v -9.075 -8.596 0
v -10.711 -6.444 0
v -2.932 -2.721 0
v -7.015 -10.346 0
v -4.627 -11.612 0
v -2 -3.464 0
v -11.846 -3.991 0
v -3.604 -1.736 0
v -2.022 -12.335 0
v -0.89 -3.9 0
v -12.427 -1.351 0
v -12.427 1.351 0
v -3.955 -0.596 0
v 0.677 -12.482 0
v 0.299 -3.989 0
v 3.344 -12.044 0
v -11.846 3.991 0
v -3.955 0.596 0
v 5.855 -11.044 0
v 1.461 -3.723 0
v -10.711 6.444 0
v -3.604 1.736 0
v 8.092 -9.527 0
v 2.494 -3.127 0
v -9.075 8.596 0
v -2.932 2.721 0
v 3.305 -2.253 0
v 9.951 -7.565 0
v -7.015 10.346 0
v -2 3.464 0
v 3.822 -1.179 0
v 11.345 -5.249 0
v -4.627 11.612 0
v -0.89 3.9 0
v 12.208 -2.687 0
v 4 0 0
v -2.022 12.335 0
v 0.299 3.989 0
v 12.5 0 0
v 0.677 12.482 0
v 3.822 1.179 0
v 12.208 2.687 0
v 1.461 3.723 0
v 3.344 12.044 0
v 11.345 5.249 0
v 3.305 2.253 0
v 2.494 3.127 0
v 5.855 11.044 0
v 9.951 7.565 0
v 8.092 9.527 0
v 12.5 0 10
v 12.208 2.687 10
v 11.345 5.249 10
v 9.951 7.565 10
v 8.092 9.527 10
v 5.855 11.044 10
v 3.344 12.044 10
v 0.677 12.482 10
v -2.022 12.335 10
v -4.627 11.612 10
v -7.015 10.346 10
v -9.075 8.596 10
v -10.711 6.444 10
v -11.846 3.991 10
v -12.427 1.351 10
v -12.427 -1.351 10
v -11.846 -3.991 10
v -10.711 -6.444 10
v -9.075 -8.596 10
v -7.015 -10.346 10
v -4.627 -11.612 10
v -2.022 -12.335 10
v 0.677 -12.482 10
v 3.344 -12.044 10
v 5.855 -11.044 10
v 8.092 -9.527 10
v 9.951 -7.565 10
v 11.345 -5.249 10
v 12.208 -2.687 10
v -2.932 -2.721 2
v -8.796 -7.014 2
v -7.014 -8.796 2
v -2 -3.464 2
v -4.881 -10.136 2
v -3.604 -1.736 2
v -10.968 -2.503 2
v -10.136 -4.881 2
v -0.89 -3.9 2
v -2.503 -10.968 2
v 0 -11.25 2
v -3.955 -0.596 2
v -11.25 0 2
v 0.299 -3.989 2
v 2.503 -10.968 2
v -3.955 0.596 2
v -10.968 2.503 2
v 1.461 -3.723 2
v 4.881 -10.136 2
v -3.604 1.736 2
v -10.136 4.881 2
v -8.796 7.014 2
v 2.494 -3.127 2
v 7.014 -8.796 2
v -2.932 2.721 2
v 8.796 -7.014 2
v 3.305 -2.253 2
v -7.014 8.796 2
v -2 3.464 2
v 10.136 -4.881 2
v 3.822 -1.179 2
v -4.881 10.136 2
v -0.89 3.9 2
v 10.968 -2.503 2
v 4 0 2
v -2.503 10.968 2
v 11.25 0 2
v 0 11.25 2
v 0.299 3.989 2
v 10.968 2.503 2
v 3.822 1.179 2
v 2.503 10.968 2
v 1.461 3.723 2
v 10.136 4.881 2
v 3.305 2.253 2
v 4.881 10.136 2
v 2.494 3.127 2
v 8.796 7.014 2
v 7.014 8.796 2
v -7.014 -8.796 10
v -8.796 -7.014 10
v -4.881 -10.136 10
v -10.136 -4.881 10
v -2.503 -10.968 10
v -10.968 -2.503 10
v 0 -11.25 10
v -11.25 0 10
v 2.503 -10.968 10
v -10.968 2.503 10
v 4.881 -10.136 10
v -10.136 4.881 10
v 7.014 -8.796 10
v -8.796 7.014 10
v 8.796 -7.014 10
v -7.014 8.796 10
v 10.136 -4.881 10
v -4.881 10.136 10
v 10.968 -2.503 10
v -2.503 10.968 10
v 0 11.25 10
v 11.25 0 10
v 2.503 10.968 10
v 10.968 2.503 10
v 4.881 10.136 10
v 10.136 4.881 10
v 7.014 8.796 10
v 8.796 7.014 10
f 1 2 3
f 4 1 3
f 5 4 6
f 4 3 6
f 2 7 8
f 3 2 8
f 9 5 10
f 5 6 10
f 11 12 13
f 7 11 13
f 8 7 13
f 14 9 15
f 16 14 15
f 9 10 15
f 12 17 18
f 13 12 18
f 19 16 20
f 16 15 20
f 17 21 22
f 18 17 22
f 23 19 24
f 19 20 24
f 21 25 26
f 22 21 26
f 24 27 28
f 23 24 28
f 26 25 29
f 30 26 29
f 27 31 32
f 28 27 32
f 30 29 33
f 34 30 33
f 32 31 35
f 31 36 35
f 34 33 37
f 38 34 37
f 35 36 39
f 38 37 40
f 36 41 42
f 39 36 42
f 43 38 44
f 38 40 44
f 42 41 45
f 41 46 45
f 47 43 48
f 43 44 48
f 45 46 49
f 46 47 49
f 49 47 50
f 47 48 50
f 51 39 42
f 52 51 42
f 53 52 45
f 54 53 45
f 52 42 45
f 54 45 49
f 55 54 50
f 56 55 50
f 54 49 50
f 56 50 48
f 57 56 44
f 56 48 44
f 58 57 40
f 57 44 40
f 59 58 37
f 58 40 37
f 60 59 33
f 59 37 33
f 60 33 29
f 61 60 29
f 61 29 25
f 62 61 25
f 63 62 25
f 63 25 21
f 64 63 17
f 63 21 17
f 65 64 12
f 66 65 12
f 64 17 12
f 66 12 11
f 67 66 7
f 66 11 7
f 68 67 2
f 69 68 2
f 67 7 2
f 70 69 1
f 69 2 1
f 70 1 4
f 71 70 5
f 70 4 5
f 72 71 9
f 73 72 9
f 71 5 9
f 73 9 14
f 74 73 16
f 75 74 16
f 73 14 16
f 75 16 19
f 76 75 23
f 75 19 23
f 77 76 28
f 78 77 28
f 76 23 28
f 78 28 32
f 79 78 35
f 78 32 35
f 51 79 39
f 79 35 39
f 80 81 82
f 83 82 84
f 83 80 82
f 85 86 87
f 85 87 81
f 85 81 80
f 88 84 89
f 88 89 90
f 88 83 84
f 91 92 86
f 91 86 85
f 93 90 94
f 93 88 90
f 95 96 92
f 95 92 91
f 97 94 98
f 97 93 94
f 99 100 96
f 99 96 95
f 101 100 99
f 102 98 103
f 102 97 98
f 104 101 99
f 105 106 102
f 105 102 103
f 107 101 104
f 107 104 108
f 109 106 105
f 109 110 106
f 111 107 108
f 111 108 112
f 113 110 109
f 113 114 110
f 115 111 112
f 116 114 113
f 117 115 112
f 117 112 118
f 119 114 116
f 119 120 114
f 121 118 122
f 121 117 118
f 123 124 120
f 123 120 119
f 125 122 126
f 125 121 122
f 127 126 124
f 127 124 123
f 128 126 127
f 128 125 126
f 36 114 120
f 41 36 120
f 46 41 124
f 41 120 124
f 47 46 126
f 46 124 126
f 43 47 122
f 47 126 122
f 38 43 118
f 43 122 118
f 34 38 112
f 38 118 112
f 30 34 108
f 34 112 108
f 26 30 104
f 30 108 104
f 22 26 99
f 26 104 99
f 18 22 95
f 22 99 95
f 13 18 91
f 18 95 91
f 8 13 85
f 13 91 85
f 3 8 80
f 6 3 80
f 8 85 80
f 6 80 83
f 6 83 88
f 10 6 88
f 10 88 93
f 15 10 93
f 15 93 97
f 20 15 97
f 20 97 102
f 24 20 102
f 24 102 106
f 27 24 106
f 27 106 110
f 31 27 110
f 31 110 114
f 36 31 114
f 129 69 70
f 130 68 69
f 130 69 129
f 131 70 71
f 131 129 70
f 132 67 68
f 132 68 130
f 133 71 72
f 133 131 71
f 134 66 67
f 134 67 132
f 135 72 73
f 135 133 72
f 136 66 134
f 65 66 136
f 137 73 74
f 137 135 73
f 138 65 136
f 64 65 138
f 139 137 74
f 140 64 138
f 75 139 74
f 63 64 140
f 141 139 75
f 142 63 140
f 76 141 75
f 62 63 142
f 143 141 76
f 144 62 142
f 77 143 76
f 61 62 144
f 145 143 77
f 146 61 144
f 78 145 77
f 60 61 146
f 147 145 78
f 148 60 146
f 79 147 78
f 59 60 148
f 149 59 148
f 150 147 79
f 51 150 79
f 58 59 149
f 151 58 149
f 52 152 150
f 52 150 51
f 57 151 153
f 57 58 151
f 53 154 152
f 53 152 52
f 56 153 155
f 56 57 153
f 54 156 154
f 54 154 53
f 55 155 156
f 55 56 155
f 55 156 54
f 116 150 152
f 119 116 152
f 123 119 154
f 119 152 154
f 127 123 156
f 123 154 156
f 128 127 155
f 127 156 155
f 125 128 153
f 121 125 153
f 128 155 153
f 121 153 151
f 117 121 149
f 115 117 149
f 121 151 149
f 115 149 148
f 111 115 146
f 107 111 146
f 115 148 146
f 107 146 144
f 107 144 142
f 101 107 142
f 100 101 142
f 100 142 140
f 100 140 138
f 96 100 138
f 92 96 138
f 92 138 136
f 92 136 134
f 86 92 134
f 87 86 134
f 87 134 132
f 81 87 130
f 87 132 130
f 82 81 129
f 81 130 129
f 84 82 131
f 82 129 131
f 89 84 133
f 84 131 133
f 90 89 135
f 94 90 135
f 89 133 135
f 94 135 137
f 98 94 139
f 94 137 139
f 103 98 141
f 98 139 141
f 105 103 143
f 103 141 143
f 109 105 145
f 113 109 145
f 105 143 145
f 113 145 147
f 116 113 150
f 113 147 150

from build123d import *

# Parameters (mm, degrees)
F0_R     = 12.5
F1_DEPTH = 10
F2_R     = 4
F3_DEPTH = 25
F2_R_2   = 11.25
F4_DEPTH = 8


with BuildPart() as f1:
    # F0 (on Top) → F1 (new body)
    with BuildSketch(Plane.XY):
        Circle(F0_R)
    extrude(amount=F1_DEPTH)

    # F2 (on face) → F3 (cut)
    with BuildSketch(Plane.XY.offset(10)):
        Circle(F2_R)
    extrude(amount=-F3_DEPTH, mode=Mode.SUBTRACT)

    # F2 (on face) → F4 (cut)
    with BuildSketch(Plane.XY.offset(10)):
        Circle(F2_R_2)
        Circle(F2_R, mode=Mode.SUBTRACT)
    extrude(amount=-F4_DEPTH, mode=Mode.SUBTRACT)


solid = f1.part
